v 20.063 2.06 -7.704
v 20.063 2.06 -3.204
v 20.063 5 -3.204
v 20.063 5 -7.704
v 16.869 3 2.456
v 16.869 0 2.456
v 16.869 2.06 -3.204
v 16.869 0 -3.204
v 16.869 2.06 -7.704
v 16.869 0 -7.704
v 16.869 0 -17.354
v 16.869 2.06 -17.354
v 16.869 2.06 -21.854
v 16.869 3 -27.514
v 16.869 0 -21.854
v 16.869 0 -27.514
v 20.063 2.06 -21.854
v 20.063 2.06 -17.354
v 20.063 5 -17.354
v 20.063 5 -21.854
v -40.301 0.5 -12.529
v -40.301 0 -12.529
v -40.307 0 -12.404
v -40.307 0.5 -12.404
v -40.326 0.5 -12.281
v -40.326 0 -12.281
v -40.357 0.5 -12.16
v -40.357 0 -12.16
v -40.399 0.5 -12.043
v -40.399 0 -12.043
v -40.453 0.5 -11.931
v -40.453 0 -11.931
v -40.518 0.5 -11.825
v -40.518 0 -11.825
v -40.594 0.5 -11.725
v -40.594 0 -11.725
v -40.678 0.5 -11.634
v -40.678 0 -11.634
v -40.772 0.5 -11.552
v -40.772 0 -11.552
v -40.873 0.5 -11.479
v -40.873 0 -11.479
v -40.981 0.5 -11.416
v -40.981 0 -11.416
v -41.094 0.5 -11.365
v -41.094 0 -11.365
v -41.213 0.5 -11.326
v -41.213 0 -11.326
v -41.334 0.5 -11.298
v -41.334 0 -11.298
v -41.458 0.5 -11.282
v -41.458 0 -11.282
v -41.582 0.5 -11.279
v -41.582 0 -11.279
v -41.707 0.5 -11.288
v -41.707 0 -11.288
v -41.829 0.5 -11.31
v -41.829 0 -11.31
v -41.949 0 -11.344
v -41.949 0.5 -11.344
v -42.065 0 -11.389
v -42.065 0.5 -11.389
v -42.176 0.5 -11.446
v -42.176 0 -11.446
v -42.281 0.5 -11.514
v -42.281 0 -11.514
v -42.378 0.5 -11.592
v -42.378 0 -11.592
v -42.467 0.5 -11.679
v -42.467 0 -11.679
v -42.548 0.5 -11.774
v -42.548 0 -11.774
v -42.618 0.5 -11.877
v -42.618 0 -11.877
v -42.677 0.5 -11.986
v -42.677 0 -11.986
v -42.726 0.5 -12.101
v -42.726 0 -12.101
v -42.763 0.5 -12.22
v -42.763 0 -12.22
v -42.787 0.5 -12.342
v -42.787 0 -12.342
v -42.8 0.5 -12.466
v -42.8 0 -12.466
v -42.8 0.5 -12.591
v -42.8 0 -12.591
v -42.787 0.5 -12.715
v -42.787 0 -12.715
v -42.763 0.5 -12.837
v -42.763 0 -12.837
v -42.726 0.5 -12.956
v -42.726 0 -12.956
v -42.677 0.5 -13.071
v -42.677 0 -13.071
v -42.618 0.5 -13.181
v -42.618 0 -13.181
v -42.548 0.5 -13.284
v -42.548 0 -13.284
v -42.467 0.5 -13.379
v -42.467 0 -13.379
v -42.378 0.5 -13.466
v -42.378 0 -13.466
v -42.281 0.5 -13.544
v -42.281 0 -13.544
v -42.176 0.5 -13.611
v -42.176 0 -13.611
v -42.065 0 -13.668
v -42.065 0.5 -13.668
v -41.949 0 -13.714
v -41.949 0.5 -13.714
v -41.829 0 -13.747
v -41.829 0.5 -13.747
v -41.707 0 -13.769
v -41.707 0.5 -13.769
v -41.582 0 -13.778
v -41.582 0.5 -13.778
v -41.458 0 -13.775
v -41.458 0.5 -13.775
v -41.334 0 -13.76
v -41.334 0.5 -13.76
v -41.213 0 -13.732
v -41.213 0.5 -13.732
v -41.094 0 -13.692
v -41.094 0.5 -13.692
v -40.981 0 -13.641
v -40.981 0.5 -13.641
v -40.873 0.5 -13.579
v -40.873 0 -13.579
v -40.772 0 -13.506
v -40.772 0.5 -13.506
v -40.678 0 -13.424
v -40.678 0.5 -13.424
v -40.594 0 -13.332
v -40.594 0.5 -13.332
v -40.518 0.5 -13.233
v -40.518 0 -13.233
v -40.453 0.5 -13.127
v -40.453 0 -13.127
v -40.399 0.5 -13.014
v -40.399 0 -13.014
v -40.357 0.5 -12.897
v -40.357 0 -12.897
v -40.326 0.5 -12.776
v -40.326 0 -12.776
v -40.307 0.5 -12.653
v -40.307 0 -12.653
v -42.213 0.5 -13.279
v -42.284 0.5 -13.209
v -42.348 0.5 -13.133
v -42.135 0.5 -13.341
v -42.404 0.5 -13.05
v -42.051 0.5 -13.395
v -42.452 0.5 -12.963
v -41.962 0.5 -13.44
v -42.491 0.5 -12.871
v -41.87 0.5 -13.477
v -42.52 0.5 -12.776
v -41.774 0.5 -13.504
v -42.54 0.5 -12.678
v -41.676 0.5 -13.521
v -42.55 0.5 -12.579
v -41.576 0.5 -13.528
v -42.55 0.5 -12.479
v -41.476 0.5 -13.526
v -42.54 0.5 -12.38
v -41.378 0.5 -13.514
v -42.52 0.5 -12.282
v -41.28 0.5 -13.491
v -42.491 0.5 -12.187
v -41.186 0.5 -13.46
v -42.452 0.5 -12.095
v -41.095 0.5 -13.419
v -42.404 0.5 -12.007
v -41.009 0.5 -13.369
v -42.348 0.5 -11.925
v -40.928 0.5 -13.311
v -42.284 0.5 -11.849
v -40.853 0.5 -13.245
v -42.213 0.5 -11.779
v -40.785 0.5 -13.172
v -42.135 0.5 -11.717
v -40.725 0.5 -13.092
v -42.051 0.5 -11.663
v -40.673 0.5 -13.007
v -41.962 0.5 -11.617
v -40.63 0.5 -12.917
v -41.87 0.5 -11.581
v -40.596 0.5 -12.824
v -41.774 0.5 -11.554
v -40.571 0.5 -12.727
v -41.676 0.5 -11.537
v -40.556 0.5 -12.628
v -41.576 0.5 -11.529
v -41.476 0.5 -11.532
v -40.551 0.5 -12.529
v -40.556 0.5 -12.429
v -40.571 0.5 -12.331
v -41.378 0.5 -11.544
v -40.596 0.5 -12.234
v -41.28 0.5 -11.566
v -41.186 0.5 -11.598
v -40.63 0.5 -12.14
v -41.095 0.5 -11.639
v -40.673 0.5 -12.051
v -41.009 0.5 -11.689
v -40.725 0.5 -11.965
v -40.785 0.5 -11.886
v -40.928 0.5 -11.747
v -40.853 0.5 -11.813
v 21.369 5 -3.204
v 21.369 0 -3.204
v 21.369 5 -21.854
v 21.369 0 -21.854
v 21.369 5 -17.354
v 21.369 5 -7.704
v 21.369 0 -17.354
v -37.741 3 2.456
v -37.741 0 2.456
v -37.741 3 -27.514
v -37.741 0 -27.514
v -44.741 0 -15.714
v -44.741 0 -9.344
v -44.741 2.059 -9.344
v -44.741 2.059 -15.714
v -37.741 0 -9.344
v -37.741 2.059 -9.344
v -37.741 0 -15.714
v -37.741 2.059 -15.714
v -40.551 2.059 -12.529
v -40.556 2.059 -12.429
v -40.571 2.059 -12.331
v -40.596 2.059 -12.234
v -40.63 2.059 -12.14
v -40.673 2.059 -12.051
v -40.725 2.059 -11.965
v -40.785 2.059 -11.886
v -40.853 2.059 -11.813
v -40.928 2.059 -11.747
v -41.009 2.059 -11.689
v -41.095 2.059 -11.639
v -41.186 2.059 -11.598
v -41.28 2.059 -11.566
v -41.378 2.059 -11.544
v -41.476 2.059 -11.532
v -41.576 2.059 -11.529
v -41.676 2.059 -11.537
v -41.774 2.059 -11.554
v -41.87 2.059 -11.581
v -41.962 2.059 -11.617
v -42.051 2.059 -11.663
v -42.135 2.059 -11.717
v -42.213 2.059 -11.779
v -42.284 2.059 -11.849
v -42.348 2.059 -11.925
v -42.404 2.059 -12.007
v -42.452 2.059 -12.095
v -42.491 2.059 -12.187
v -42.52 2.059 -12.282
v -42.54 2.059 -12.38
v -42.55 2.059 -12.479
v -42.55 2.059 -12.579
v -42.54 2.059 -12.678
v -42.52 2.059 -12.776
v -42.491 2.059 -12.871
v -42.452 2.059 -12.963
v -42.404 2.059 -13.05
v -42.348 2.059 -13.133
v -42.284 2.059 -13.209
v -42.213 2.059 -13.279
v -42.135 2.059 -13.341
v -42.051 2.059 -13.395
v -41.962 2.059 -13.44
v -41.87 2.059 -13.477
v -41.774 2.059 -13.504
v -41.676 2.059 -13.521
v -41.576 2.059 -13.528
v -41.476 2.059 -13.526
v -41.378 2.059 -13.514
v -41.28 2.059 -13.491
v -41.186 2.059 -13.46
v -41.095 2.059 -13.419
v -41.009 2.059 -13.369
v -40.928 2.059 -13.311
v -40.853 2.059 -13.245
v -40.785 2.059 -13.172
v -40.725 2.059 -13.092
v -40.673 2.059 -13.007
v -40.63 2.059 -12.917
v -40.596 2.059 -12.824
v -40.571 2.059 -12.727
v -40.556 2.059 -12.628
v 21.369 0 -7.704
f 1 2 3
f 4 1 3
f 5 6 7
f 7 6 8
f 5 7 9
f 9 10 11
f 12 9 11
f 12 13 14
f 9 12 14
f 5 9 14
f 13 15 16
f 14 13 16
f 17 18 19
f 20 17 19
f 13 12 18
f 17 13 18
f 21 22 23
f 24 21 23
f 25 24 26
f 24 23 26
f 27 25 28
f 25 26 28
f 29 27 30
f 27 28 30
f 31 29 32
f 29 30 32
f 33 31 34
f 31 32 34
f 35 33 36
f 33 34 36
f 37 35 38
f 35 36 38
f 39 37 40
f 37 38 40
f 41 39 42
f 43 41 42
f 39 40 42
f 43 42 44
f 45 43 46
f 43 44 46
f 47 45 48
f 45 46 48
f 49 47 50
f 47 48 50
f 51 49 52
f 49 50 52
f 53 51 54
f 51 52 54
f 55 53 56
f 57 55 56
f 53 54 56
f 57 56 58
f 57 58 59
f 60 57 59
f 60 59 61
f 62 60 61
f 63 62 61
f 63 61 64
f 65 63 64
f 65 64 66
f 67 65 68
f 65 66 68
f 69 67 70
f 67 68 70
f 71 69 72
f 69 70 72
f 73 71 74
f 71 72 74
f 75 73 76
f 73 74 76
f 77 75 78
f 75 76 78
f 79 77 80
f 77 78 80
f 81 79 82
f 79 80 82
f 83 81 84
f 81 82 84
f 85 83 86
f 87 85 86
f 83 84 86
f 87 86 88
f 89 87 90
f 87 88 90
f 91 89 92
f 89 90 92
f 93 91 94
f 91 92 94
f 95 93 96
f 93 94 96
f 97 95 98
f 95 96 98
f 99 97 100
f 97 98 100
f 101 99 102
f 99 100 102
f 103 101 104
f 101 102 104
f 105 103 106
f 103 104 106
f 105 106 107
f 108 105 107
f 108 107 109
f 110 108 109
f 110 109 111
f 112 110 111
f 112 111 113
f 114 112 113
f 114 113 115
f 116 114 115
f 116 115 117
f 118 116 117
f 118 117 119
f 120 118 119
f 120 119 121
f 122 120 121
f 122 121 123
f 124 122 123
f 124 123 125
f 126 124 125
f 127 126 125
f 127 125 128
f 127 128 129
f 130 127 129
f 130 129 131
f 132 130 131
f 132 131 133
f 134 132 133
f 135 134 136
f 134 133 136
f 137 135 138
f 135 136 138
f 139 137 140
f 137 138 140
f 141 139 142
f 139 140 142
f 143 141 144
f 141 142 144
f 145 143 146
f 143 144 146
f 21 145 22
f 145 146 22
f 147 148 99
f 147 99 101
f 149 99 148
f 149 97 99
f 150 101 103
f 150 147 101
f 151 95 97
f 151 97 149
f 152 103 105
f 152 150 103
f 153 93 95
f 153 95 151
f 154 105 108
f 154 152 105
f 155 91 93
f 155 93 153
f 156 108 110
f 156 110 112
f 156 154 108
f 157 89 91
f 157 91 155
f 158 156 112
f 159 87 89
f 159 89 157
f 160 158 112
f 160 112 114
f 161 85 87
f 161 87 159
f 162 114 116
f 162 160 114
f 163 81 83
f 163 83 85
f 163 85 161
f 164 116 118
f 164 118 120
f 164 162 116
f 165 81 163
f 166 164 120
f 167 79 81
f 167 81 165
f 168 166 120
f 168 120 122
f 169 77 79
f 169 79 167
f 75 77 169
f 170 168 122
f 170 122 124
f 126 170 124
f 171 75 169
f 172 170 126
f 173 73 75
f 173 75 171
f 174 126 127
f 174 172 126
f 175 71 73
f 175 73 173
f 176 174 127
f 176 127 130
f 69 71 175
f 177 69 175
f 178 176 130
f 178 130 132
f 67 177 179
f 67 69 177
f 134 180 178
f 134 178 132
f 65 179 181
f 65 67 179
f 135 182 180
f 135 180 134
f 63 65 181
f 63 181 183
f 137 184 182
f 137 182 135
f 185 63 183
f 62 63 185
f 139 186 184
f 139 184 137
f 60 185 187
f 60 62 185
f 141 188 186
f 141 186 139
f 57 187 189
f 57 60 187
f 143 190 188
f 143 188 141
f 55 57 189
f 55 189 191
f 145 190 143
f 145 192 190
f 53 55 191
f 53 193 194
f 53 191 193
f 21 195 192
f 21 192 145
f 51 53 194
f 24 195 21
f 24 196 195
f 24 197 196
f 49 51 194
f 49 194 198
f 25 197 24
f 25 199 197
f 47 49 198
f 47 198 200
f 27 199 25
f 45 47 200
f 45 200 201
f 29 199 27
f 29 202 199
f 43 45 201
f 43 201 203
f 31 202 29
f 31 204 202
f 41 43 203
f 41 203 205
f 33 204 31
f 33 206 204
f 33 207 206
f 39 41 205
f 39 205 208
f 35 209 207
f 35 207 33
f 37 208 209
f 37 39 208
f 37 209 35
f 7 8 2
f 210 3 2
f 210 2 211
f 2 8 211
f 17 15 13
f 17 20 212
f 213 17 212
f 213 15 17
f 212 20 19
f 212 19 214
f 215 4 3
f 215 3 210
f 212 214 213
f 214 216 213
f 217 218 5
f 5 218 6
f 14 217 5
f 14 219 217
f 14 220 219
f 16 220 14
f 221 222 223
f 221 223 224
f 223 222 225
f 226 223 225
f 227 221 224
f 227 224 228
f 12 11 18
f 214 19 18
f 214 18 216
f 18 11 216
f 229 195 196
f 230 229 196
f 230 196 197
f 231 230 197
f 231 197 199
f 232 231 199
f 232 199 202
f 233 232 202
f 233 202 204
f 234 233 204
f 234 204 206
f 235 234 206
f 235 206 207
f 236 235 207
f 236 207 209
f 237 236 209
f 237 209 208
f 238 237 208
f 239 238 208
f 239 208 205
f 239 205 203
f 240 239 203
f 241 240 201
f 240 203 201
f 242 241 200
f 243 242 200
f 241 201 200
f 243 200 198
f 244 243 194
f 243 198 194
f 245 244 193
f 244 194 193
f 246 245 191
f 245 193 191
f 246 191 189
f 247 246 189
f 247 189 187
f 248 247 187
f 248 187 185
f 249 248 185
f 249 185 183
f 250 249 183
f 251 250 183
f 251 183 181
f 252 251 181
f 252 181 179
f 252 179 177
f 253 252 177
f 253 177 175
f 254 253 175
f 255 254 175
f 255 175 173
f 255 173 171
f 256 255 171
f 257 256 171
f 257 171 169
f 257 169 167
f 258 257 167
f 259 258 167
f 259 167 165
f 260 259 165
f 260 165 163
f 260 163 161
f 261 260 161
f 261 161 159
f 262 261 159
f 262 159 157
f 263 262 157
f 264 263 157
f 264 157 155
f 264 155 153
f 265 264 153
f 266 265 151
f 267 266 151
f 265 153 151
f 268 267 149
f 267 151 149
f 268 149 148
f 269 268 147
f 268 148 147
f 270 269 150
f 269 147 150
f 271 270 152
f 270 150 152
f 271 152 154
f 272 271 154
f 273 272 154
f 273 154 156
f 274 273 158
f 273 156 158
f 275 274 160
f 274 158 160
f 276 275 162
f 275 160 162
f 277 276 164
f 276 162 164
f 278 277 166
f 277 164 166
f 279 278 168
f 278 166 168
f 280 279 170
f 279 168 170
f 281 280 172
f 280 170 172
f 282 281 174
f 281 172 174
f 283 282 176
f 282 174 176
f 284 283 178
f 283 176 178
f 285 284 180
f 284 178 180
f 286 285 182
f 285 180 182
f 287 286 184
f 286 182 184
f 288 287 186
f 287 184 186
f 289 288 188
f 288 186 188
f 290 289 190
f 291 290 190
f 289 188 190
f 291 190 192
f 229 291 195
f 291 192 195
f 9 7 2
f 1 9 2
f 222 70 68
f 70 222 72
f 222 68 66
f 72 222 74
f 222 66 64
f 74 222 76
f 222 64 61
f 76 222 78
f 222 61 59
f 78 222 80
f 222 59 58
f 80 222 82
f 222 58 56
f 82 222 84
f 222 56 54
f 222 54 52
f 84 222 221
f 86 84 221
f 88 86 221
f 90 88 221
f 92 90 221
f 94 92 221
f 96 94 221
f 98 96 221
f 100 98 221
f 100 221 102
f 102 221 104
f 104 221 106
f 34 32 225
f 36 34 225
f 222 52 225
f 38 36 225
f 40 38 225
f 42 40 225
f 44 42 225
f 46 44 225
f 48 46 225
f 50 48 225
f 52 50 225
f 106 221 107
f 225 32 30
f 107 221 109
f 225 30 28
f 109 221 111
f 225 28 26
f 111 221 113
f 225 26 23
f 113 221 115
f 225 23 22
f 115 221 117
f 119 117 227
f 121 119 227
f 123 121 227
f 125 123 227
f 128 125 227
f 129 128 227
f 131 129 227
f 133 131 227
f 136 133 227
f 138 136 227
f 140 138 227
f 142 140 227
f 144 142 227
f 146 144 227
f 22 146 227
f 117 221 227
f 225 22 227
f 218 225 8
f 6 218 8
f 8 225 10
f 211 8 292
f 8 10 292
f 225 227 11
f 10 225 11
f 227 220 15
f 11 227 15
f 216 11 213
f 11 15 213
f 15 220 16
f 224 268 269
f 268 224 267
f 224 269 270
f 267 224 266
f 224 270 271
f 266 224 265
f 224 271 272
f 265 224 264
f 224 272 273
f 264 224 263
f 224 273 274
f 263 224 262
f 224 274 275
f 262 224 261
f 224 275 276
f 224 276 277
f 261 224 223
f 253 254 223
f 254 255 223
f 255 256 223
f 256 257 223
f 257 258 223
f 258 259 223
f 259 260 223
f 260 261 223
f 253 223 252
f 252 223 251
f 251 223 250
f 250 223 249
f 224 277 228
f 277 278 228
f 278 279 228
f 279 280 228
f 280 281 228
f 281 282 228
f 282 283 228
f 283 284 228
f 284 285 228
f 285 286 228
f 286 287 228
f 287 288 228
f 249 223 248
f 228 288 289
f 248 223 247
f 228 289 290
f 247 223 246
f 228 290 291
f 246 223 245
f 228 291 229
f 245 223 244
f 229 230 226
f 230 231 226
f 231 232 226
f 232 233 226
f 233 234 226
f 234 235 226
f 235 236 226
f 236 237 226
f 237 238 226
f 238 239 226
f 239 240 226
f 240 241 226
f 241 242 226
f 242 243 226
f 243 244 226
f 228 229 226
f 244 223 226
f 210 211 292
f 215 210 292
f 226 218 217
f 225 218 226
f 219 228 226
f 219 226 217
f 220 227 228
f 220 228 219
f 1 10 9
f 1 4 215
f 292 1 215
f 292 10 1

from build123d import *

# Parameters (mm, degrees)
SKETCH2_W               = 54.61
SKETCH2_H               = 29.97
SKETCH2_W_2             = 7
SKETCH2_H_2             = 6.37
SKETCH2_W_3             = 4.5
SKETCH2_H_3             = 4.5
BOSS_EXTRUDE4_DEPTH     = 3
SKETCH3_W               = 7
SKETCH3_H               = 6.37
BOSS_EXTRUDE5_DEPTH     = 3
SKETCH4_W               = 4.5
SKETCH4_H               = 4.5
BOSS_EXTRUDE6_DEPTH     = 2
SKETCH6_W               = 3.19390973
SKETCH6_H               = 2.94
CUT_EXTRUDE1_DEPTH      = 6.66
CUT_EXTRUDE1_DEPTH_BACK = 25.31
CUT_EXTRUDE3_REACH      = 20.17
SKETCH10_R              = 1
CUT_EXTRUDE4_DEPTH      = 5
SKETCH12_R              = 1.25
CUT_EXTRUDE5_DEPTH      = 0.5


with BuildPart() as part:
    # Sketch2 → Boss-Extrude4 (new body)
    with BuildSketch(Plane(origin=(0, 0, 0), x_dir=(1, 0, 0), z_dir=(0, 1, 0))):
        with Locations((-10.436162564, 12.528789446)):
            Rectangle(SKETCH2_W, SKETCH2_H)
        with Locations((-41.241162564, 12.528789446)):
            Rectangle(SKETCH2_W_2, SKETCH2_H_2)
        with Locations((19.118837436, 5.453789446)):
            Rectangle(SKETCH2_W_3, SKETCH2_H_3)
        with Locations((19.118837436, 19.603789446)):
            Rectangle(SKETCH2_W_3, SKETCH2_H_3)
    extrude(amount=BOSS_EXTRUDE4_DEPTH)

    # Sketch3 → Boss-Extrude5 (add)
    with BuildSketch(Plane(origin=(0, 3, 0), x_dir=(1, 0, 0), z_dir=(0, 1, 0))):
        with Locations((-41.241162564, 12.528789446)):
            Rectangle(SKETCH3_W, SKETCH3_H)
    extrude(amount=BOSS_EXTRUDE5_DEPTH)

    # Sketch4 → Boss-Extrude6 (add)
    with BuildSketch(Plane(origin=(0, 3, 0), x_dir=(1, 0, 0), z_dir=(0, 1, 0))):
        with Locations((19.118837436, 19.603789446)):
            Rectangle(SKETCH4_W, SKETCH4_H)
        with Locations((19.118837436, 5.453789446)):
            Rectangle(SKETCH4_W, SKETCH4_H)
    extrude(amount=BOSS_EXTRUDE6_DEPTH)

    # Sketch6 → Cut-Extrude1 (cut, two sides)
    with BuildSketch(Plane.XY.offset(-3.203789446)) as cut_extrude1_sk:
        with Locations((18.465792301, 3.53)):
            Rectangle(SKETCH6_W, SKETCH6_H)
    extrude(amount=CUT_EXTRUDE1_DEPTH, mode=Mode.SUBTRACT)
    extrude(cut_extrude1_sk.sketch, amount=-CUT_EXTRUDE1_DEPTH_BACK, mode=Mode.SUBTRACT)

    # Sketch8 → Cut-Extrude3 (cut, up to next)
    with BuildSketch(Plane.XY.offset(-9.343789446), mode=Mode.PRIVATE) as cut_extrude3_sk1:
        Polygon((-37.741162564, 6), (-42.018009261, 6), (-42.018009261, 6.012510793), (-43.247603098, 6.012510793), (-43.247603098, 6.015261621), (-44.781895645, 6.015261621), (-44.781895645, 2.058576766), (-37.741162564, 2.058576766), align=None)
    cut_extrude3_tool1 = extrude(cut_extrude3_sk1.sketch, amount=-CUT_EXTRUDE3_REACH, mode=Mode.PRIVATE) & part.part
    add(cut_extrude3_tool1.solids().sort_by_distance((-41.264608, 4.03205, -9.343789))[0], mode=Mode.SUBTRACT)

    # Sketch10 → Cut-Extrude4 (cut)
    with BuildSketch(Plane.XZ):
        with Locations((-41.551162564, -12.528789446)):
            Circle(SKETCH10_R)
    extrude(amount=-CUT_EXTRUDE4_DEPTH, mode=Mode.SUBTRACT)

    # Sketch12 → Cut-Extrude5 (cut)
    with BuildSketch(Plane.XZ):
        with Locations((-41.551162564, -12.528789446)):
            Circle(SKETCH12_R)
    extrude(amount=-CUT_EXTRUDE5_DEPTH, mode=Mode.SUBTRACT)


solid = part.part
